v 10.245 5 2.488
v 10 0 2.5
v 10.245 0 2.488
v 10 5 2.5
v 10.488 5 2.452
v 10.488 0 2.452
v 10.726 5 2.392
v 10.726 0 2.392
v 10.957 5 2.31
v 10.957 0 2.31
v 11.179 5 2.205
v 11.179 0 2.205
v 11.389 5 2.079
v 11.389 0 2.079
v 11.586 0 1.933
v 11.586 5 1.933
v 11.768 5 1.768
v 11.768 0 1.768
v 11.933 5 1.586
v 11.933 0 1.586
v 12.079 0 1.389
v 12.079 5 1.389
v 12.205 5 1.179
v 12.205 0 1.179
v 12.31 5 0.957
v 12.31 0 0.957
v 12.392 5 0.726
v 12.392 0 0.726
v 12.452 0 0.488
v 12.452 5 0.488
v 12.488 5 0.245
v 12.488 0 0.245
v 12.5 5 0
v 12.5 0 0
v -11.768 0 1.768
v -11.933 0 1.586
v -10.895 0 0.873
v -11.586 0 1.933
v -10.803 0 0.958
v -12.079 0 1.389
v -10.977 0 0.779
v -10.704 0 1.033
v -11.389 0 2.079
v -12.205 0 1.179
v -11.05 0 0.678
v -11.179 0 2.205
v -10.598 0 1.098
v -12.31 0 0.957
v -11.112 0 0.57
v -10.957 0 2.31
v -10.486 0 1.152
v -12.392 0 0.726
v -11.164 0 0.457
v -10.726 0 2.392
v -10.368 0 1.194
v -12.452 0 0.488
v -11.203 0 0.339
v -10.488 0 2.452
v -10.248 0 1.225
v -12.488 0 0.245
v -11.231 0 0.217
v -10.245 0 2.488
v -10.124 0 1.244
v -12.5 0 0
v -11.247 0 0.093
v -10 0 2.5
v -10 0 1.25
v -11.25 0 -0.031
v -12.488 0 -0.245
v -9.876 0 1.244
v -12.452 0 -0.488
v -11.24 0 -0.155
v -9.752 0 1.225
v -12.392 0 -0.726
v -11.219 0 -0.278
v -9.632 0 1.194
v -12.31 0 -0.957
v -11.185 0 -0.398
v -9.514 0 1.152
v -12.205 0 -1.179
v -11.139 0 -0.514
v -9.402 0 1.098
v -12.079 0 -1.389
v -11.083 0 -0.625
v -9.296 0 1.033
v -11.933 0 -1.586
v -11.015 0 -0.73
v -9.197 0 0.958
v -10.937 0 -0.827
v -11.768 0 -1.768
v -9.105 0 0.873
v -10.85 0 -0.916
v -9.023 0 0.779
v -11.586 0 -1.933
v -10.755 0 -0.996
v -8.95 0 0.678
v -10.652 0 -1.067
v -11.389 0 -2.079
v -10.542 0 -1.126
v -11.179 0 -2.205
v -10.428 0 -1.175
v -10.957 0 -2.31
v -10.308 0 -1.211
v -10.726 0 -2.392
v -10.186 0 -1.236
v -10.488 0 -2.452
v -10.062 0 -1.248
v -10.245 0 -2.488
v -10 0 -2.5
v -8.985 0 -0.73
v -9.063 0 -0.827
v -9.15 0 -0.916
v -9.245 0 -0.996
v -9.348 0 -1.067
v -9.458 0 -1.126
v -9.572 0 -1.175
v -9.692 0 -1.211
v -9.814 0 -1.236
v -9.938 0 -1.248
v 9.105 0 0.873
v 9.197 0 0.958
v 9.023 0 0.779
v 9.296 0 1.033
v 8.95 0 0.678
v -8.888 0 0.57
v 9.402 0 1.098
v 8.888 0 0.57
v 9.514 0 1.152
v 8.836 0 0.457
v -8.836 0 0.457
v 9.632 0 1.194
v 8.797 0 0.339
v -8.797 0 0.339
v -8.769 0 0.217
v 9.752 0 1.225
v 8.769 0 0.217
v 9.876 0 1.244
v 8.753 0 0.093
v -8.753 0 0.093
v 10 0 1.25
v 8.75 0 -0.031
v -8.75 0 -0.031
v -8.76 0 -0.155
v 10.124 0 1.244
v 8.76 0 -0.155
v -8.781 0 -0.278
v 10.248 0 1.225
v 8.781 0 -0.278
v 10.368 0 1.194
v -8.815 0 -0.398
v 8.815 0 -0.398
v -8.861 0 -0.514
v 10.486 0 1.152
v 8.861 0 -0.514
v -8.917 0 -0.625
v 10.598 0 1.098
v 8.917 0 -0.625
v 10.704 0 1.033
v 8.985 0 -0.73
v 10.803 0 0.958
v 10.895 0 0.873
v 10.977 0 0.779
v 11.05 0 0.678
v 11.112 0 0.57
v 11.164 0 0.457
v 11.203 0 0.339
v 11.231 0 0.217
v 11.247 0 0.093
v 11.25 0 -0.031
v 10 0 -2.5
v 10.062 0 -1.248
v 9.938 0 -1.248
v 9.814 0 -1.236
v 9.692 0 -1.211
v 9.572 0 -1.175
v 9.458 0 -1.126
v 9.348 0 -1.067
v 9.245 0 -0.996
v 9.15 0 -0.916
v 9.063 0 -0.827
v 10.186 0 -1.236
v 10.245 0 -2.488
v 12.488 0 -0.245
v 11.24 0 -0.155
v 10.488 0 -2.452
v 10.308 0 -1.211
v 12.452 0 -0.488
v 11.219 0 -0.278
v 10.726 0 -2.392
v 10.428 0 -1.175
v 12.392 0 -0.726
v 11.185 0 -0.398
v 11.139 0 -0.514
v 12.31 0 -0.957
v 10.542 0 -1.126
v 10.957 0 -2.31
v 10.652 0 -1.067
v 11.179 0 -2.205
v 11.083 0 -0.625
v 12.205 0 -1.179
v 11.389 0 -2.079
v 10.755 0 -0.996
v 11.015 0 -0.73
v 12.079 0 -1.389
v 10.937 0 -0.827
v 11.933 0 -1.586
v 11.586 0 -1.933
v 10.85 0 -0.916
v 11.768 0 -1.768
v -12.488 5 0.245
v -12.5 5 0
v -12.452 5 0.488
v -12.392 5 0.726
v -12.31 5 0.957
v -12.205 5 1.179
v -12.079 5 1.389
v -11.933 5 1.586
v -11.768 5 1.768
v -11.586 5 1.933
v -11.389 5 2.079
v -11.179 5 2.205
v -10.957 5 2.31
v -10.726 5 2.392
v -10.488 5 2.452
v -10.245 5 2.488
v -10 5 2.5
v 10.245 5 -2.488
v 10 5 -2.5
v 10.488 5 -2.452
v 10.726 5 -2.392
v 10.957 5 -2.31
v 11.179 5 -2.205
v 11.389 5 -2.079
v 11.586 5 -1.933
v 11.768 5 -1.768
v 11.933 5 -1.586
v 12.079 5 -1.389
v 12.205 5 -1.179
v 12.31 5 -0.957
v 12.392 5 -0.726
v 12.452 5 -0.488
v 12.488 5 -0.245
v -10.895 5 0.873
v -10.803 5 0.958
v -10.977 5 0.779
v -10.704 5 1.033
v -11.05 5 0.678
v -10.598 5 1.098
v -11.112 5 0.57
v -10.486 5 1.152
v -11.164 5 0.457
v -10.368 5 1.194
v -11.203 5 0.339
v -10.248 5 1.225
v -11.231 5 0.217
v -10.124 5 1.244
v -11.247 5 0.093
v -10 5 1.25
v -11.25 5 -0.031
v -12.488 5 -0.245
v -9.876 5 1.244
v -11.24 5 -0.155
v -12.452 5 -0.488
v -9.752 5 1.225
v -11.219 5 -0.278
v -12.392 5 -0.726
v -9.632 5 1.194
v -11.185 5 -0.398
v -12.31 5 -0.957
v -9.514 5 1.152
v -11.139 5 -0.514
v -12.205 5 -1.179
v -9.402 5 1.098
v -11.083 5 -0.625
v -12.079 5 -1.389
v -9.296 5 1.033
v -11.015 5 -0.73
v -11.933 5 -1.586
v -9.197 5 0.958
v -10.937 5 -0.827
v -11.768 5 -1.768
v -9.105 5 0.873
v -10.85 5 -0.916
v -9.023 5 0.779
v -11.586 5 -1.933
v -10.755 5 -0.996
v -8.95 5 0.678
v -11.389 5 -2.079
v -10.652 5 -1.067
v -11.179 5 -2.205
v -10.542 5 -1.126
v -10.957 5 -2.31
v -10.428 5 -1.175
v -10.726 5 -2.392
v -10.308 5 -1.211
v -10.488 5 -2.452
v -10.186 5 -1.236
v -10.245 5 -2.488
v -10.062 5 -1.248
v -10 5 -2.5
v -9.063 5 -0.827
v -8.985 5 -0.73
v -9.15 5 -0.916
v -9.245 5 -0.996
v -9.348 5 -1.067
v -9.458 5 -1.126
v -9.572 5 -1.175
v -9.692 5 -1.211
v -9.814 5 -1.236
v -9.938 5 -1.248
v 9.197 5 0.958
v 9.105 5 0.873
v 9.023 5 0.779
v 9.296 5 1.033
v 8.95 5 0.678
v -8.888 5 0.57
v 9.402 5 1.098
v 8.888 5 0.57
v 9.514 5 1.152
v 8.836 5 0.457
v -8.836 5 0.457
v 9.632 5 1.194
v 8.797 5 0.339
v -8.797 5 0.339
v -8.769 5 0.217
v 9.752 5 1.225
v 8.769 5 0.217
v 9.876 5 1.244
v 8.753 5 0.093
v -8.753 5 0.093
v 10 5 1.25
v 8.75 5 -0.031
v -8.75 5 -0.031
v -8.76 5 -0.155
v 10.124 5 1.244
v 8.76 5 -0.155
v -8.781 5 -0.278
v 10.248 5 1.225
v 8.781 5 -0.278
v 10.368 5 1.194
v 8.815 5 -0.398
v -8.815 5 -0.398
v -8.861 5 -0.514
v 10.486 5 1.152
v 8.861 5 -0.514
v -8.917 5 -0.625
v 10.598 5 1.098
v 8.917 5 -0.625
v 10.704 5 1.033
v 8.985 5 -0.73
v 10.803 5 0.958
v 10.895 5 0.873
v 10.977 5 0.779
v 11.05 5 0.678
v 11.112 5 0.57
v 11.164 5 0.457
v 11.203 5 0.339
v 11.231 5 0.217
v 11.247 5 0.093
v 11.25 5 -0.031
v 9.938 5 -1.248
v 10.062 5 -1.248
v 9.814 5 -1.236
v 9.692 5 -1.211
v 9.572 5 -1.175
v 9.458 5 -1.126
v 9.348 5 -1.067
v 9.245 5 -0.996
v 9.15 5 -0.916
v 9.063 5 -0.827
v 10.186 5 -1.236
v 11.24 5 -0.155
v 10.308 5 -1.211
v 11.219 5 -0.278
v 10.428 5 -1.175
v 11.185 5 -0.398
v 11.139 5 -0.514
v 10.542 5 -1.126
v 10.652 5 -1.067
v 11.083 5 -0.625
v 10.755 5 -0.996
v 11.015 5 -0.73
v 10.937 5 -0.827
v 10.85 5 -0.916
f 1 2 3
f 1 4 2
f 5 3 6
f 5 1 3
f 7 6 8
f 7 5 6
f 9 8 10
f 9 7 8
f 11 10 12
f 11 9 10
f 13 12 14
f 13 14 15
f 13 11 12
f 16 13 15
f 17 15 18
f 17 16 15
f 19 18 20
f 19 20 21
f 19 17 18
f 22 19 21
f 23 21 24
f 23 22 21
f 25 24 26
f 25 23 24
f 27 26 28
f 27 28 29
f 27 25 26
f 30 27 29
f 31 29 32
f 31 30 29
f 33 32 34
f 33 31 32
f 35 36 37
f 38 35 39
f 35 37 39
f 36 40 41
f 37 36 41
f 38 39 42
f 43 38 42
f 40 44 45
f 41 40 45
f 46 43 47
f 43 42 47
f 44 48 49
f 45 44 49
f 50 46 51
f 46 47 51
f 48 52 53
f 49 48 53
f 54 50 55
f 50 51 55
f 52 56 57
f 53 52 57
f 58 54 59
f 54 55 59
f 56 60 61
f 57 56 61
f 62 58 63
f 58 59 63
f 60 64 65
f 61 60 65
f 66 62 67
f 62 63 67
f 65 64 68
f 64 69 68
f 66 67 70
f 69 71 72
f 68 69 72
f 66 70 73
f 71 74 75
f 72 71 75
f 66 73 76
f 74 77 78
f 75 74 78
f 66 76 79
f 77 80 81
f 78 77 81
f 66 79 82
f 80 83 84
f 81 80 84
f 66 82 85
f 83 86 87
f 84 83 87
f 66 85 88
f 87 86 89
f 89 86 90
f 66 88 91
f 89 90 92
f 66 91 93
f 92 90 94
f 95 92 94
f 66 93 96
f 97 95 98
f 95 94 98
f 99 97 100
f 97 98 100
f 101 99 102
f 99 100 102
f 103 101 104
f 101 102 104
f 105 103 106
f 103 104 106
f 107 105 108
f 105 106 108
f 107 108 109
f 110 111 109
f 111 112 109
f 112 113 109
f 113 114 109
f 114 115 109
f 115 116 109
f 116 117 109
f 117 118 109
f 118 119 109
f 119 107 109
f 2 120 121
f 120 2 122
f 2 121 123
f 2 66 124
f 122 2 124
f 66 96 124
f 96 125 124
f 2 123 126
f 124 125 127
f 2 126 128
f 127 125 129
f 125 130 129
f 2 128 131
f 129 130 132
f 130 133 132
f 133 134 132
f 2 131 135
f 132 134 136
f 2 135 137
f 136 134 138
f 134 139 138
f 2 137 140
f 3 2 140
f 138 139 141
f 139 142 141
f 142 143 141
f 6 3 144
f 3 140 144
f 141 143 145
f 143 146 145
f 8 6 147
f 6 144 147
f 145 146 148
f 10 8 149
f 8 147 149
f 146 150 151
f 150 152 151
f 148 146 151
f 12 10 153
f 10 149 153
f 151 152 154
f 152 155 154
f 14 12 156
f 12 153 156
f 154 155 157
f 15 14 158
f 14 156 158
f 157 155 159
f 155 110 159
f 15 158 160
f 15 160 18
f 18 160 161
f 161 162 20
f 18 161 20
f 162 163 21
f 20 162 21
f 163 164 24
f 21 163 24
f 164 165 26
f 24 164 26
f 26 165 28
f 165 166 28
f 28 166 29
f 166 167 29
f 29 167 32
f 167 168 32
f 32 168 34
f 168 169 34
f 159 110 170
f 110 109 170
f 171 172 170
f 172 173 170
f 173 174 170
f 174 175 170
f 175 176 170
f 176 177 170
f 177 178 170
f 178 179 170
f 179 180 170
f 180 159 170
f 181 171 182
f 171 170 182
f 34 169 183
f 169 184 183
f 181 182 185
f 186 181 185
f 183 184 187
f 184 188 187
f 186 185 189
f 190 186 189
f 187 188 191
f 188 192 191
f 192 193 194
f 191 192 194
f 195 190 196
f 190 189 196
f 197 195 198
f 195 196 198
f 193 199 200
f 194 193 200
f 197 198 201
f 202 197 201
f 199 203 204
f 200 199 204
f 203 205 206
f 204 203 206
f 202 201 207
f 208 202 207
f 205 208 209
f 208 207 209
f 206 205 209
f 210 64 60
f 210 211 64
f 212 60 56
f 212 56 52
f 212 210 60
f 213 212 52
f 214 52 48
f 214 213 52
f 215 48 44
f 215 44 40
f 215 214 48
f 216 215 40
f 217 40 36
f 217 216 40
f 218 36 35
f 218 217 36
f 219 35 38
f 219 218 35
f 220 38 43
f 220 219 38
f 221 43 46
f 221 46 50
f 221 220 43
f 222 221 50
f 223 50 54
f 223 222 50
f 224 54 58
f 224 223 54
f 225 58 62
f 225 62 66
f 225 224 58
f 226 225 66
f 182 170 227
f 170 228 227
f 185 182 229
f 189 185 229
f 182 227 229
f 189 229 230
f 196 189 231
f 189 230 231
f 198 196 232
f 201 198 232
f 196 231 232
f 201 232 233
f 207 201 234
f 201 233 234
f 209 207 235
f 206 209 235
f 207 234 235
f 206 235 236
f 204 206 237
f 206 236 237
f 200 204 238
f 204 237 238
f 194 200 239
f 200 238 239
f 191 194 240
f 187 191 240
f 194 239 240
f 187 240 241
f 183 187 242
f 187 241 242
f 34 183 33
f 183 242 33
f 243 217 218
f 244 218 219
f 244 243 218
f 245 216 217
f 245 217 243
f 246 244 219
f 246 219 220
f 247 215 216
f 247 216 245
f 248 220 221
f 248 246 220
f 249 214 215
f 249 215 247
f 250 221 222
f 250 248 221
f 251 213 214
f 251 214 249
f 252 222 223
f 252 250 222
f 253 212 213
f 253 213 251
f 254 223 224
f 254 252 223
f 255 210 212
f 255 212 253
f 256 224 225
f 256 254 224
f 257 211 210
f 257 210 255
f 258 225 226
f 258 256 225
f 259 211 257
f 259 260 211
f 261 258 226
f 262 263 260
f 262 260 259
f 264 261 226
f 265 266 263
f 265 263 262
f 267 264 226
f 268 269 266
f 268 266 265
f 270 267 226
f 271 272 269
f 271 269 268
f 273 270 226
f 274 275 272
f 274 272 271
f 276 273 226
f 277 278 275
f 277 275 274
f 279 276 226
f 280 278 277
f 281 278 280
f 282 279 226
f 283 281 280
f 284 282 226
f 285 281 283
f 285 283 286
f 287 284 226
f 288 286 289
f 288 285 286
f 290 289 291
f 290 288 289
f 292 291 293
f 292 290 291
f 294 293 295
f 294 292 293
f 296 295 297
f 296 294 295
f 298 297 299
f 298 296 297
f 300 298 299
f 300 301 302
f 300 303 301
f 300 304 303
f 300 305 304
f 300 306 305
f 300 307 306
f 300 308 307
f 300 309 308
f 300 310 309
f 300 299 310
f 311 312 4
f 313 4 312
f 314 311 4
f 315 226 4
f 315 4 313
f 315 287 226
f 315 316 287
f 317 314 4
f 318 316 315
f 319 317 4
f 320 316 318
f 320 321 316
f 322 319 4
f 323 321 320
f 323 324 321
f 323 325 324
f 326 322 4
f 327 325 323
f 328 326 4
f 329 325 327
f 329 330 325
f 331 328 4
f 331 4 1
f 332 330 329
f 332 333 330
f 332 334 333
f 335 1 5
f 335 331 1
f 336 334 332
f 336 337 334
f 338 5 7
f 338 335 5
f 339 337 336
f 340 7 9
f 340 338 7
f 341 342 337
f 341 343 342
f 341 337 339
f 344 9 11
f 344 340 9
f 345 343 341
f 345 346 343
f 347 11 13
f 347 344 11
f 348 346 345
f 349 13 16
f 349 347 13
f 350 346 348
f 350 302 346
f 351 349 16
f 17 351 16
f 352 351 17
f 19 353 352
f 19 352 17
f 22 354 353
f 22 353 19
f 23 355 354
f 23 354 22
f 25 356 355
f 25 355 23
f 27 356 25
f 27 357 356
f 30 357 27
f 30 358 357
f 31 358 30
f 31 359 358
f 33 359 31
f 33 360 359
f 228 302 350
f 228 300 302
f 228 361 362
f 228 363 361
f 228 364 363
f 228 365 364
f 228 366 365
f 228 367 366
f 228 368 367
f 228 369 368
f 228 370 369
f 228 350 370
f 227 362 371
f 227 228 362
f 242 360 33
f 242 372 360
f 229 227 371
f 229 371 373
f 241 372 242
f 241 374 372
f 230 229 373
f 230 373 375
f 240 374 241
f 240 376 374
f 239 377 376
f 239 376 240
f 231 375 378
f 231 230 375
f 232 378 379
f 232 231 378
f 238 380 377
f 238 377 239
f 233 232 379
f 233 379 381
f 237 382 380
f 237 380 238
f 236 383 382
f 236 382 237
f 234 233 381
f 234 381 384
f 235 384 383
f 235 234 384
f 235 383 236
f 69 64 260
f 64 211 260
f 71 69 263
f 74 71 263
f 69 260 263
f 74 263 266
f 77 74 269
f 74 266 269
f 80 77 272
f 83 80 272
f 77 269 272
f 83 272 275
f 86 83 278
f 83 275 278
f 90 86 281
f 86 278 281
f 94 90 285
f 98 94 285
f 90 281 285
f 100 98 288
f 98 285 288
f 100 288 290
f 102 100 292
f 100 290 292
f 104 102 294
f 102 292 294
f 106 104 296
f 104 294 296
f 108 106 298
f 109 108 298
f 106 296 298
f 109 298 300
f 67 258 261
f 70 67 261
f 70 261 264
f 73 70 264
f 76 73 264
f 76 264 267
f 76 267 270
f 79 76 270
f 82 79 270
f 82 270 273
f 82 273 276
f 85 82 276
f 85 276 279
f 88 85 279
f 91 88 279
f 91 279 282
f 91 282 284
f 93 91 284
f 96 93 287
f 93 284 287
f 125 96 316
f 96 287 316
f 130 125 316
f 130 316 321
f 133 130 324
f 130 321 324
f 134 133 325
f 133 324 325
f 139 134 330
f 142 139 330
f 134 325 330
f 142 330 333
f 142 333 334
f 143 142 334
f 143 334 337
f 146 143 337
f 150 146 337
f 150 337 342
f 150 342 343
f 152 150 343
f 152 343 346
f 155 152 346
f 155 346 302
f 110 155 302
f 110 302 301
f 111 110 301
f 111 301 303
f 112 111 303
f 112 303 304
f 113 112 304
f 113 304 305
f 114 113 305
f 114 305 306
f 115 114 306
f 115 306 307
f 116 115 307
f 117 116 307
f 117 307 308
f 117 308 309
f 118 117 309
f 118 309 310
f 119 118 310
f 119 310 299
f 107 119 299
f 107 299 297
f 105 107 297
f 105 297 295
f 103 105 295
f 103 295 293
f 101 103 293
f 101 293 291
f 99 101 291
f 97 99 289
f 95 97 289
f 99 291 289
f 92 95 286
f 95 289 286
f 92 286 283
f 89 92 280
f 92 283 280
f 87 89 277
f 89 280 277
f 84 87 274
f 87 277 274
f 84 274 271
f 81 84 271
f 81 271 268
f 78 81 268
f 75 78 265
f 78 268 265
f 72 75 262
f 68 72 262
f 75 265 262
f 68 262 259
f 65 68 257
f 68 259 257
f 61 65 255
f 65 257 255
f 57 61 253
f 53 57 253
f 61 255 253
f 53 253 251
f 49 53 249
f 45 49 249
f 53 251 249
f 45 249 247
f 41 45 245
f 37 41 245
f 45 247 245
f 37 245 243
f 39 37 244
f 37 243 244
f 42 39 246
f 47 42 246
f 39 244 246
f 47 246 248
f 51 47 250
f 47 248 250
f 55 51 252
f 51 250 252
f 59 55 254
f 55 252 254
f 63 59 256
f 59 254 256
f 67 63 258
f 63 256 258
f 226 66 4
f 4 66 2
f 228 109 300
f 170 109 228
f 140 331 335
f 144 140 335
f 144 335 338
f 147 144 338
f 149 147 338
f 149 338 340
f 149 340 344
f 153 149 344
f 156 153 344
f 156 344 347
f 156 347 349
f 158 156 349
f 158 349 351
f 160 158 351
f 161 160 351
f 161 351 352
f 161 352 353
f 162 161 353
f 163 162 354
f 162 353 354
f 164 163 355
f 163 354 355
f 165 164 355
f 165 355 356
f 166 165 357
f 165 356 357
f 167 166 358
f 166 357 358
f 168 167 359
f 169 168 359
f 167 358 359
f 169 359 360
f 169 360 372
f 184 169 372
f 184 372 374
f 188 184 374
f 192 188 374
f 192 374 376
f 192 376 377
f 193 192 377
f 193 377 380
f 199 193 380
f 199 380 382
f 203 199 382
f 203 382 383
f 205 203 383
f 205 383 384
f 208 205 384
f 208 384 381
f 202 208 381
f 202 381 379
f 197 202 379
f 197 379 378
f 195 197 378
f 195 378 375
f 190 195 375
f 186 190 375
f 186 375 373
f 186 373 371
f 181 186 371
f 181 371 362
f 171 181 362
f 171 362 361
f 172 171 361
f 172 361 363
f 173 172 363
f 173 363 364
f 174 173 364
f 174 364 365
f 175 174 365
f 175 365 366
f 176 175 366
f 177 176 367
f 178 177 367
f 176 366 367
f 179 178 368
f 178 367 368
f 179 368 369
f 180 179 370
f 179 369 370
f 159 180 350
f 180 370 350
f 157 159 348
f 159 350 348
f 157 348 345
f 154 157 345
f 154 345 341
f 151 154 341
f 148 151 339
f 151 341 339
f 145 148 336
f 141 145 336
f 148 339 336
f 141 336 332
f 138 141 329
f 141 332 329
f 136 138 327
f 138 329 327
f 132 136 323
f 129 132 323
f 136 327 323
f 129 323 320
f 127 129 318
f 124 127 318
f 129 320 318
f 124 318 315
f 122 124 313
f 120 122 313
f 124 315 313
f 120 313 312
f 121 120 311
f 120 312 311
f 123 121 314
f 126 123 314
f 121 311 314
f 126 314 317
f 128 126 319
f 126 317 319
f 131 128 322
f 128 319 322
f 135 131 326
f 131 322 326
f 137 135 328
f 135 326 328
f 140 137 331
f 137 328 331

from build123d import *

# Parameters (mm, degrees)
SKETCH1_W           = 25
SKETCH1_H           = 5
BOSS_EXTRUDE1_DEPTH = 5
SKETCH2_R           = 1.25
CUT_EXTRUDE1_DEPTH  = 14.693063938
FILLET1_R           = 2.5


with BuildPart() as part:
    # Sketch1 → Boss-Extrude1 (new body)
    with BuildSketch(Plane(origin=(0, 0, 0), x_dir=(1, 0, 0), z_dir=(0, 1, 0))):
        Rectangle(SKETCH1_W, SKETCH1_H)
    extrude(amount=BOSS_EXTRUDE1_DEPTH)

    # Sketch2 → Cut-Extrude1 (cut, through all)
    with BuildSketch(Plane(origin=(0, 5, 0), x_dir=(1, 0, 0), z_dir=(0, 1, 0))):
        with Locations(Location((-10, 0, 0), (0, 0, 270))):
            Circle(SKETCH2_R)
        with Locations(Location((10, 0, 0), (0, 0, 270))):
            Circle(SKETCH2_R)
    extrude(amount=-CUT_EXTRUDE1_DEPTH, mode=Mode.SUBTRACT)

    # Fillet1
    fillet1_edges = [part.edges().sort_by_distance(p)[0] for p in [
        (12.5, 2.5, 2.5),
        (12.5, 2.5, -2.5),
        (-12.5, 2.5, 2.5),
        (-12.5, 2.5, -2.5),
    ]]
    fillet(fillet1_edges, radius=FILLET1_R - 0.0001)  # a hair under: the kernel refuses the full size


solid = part.part
